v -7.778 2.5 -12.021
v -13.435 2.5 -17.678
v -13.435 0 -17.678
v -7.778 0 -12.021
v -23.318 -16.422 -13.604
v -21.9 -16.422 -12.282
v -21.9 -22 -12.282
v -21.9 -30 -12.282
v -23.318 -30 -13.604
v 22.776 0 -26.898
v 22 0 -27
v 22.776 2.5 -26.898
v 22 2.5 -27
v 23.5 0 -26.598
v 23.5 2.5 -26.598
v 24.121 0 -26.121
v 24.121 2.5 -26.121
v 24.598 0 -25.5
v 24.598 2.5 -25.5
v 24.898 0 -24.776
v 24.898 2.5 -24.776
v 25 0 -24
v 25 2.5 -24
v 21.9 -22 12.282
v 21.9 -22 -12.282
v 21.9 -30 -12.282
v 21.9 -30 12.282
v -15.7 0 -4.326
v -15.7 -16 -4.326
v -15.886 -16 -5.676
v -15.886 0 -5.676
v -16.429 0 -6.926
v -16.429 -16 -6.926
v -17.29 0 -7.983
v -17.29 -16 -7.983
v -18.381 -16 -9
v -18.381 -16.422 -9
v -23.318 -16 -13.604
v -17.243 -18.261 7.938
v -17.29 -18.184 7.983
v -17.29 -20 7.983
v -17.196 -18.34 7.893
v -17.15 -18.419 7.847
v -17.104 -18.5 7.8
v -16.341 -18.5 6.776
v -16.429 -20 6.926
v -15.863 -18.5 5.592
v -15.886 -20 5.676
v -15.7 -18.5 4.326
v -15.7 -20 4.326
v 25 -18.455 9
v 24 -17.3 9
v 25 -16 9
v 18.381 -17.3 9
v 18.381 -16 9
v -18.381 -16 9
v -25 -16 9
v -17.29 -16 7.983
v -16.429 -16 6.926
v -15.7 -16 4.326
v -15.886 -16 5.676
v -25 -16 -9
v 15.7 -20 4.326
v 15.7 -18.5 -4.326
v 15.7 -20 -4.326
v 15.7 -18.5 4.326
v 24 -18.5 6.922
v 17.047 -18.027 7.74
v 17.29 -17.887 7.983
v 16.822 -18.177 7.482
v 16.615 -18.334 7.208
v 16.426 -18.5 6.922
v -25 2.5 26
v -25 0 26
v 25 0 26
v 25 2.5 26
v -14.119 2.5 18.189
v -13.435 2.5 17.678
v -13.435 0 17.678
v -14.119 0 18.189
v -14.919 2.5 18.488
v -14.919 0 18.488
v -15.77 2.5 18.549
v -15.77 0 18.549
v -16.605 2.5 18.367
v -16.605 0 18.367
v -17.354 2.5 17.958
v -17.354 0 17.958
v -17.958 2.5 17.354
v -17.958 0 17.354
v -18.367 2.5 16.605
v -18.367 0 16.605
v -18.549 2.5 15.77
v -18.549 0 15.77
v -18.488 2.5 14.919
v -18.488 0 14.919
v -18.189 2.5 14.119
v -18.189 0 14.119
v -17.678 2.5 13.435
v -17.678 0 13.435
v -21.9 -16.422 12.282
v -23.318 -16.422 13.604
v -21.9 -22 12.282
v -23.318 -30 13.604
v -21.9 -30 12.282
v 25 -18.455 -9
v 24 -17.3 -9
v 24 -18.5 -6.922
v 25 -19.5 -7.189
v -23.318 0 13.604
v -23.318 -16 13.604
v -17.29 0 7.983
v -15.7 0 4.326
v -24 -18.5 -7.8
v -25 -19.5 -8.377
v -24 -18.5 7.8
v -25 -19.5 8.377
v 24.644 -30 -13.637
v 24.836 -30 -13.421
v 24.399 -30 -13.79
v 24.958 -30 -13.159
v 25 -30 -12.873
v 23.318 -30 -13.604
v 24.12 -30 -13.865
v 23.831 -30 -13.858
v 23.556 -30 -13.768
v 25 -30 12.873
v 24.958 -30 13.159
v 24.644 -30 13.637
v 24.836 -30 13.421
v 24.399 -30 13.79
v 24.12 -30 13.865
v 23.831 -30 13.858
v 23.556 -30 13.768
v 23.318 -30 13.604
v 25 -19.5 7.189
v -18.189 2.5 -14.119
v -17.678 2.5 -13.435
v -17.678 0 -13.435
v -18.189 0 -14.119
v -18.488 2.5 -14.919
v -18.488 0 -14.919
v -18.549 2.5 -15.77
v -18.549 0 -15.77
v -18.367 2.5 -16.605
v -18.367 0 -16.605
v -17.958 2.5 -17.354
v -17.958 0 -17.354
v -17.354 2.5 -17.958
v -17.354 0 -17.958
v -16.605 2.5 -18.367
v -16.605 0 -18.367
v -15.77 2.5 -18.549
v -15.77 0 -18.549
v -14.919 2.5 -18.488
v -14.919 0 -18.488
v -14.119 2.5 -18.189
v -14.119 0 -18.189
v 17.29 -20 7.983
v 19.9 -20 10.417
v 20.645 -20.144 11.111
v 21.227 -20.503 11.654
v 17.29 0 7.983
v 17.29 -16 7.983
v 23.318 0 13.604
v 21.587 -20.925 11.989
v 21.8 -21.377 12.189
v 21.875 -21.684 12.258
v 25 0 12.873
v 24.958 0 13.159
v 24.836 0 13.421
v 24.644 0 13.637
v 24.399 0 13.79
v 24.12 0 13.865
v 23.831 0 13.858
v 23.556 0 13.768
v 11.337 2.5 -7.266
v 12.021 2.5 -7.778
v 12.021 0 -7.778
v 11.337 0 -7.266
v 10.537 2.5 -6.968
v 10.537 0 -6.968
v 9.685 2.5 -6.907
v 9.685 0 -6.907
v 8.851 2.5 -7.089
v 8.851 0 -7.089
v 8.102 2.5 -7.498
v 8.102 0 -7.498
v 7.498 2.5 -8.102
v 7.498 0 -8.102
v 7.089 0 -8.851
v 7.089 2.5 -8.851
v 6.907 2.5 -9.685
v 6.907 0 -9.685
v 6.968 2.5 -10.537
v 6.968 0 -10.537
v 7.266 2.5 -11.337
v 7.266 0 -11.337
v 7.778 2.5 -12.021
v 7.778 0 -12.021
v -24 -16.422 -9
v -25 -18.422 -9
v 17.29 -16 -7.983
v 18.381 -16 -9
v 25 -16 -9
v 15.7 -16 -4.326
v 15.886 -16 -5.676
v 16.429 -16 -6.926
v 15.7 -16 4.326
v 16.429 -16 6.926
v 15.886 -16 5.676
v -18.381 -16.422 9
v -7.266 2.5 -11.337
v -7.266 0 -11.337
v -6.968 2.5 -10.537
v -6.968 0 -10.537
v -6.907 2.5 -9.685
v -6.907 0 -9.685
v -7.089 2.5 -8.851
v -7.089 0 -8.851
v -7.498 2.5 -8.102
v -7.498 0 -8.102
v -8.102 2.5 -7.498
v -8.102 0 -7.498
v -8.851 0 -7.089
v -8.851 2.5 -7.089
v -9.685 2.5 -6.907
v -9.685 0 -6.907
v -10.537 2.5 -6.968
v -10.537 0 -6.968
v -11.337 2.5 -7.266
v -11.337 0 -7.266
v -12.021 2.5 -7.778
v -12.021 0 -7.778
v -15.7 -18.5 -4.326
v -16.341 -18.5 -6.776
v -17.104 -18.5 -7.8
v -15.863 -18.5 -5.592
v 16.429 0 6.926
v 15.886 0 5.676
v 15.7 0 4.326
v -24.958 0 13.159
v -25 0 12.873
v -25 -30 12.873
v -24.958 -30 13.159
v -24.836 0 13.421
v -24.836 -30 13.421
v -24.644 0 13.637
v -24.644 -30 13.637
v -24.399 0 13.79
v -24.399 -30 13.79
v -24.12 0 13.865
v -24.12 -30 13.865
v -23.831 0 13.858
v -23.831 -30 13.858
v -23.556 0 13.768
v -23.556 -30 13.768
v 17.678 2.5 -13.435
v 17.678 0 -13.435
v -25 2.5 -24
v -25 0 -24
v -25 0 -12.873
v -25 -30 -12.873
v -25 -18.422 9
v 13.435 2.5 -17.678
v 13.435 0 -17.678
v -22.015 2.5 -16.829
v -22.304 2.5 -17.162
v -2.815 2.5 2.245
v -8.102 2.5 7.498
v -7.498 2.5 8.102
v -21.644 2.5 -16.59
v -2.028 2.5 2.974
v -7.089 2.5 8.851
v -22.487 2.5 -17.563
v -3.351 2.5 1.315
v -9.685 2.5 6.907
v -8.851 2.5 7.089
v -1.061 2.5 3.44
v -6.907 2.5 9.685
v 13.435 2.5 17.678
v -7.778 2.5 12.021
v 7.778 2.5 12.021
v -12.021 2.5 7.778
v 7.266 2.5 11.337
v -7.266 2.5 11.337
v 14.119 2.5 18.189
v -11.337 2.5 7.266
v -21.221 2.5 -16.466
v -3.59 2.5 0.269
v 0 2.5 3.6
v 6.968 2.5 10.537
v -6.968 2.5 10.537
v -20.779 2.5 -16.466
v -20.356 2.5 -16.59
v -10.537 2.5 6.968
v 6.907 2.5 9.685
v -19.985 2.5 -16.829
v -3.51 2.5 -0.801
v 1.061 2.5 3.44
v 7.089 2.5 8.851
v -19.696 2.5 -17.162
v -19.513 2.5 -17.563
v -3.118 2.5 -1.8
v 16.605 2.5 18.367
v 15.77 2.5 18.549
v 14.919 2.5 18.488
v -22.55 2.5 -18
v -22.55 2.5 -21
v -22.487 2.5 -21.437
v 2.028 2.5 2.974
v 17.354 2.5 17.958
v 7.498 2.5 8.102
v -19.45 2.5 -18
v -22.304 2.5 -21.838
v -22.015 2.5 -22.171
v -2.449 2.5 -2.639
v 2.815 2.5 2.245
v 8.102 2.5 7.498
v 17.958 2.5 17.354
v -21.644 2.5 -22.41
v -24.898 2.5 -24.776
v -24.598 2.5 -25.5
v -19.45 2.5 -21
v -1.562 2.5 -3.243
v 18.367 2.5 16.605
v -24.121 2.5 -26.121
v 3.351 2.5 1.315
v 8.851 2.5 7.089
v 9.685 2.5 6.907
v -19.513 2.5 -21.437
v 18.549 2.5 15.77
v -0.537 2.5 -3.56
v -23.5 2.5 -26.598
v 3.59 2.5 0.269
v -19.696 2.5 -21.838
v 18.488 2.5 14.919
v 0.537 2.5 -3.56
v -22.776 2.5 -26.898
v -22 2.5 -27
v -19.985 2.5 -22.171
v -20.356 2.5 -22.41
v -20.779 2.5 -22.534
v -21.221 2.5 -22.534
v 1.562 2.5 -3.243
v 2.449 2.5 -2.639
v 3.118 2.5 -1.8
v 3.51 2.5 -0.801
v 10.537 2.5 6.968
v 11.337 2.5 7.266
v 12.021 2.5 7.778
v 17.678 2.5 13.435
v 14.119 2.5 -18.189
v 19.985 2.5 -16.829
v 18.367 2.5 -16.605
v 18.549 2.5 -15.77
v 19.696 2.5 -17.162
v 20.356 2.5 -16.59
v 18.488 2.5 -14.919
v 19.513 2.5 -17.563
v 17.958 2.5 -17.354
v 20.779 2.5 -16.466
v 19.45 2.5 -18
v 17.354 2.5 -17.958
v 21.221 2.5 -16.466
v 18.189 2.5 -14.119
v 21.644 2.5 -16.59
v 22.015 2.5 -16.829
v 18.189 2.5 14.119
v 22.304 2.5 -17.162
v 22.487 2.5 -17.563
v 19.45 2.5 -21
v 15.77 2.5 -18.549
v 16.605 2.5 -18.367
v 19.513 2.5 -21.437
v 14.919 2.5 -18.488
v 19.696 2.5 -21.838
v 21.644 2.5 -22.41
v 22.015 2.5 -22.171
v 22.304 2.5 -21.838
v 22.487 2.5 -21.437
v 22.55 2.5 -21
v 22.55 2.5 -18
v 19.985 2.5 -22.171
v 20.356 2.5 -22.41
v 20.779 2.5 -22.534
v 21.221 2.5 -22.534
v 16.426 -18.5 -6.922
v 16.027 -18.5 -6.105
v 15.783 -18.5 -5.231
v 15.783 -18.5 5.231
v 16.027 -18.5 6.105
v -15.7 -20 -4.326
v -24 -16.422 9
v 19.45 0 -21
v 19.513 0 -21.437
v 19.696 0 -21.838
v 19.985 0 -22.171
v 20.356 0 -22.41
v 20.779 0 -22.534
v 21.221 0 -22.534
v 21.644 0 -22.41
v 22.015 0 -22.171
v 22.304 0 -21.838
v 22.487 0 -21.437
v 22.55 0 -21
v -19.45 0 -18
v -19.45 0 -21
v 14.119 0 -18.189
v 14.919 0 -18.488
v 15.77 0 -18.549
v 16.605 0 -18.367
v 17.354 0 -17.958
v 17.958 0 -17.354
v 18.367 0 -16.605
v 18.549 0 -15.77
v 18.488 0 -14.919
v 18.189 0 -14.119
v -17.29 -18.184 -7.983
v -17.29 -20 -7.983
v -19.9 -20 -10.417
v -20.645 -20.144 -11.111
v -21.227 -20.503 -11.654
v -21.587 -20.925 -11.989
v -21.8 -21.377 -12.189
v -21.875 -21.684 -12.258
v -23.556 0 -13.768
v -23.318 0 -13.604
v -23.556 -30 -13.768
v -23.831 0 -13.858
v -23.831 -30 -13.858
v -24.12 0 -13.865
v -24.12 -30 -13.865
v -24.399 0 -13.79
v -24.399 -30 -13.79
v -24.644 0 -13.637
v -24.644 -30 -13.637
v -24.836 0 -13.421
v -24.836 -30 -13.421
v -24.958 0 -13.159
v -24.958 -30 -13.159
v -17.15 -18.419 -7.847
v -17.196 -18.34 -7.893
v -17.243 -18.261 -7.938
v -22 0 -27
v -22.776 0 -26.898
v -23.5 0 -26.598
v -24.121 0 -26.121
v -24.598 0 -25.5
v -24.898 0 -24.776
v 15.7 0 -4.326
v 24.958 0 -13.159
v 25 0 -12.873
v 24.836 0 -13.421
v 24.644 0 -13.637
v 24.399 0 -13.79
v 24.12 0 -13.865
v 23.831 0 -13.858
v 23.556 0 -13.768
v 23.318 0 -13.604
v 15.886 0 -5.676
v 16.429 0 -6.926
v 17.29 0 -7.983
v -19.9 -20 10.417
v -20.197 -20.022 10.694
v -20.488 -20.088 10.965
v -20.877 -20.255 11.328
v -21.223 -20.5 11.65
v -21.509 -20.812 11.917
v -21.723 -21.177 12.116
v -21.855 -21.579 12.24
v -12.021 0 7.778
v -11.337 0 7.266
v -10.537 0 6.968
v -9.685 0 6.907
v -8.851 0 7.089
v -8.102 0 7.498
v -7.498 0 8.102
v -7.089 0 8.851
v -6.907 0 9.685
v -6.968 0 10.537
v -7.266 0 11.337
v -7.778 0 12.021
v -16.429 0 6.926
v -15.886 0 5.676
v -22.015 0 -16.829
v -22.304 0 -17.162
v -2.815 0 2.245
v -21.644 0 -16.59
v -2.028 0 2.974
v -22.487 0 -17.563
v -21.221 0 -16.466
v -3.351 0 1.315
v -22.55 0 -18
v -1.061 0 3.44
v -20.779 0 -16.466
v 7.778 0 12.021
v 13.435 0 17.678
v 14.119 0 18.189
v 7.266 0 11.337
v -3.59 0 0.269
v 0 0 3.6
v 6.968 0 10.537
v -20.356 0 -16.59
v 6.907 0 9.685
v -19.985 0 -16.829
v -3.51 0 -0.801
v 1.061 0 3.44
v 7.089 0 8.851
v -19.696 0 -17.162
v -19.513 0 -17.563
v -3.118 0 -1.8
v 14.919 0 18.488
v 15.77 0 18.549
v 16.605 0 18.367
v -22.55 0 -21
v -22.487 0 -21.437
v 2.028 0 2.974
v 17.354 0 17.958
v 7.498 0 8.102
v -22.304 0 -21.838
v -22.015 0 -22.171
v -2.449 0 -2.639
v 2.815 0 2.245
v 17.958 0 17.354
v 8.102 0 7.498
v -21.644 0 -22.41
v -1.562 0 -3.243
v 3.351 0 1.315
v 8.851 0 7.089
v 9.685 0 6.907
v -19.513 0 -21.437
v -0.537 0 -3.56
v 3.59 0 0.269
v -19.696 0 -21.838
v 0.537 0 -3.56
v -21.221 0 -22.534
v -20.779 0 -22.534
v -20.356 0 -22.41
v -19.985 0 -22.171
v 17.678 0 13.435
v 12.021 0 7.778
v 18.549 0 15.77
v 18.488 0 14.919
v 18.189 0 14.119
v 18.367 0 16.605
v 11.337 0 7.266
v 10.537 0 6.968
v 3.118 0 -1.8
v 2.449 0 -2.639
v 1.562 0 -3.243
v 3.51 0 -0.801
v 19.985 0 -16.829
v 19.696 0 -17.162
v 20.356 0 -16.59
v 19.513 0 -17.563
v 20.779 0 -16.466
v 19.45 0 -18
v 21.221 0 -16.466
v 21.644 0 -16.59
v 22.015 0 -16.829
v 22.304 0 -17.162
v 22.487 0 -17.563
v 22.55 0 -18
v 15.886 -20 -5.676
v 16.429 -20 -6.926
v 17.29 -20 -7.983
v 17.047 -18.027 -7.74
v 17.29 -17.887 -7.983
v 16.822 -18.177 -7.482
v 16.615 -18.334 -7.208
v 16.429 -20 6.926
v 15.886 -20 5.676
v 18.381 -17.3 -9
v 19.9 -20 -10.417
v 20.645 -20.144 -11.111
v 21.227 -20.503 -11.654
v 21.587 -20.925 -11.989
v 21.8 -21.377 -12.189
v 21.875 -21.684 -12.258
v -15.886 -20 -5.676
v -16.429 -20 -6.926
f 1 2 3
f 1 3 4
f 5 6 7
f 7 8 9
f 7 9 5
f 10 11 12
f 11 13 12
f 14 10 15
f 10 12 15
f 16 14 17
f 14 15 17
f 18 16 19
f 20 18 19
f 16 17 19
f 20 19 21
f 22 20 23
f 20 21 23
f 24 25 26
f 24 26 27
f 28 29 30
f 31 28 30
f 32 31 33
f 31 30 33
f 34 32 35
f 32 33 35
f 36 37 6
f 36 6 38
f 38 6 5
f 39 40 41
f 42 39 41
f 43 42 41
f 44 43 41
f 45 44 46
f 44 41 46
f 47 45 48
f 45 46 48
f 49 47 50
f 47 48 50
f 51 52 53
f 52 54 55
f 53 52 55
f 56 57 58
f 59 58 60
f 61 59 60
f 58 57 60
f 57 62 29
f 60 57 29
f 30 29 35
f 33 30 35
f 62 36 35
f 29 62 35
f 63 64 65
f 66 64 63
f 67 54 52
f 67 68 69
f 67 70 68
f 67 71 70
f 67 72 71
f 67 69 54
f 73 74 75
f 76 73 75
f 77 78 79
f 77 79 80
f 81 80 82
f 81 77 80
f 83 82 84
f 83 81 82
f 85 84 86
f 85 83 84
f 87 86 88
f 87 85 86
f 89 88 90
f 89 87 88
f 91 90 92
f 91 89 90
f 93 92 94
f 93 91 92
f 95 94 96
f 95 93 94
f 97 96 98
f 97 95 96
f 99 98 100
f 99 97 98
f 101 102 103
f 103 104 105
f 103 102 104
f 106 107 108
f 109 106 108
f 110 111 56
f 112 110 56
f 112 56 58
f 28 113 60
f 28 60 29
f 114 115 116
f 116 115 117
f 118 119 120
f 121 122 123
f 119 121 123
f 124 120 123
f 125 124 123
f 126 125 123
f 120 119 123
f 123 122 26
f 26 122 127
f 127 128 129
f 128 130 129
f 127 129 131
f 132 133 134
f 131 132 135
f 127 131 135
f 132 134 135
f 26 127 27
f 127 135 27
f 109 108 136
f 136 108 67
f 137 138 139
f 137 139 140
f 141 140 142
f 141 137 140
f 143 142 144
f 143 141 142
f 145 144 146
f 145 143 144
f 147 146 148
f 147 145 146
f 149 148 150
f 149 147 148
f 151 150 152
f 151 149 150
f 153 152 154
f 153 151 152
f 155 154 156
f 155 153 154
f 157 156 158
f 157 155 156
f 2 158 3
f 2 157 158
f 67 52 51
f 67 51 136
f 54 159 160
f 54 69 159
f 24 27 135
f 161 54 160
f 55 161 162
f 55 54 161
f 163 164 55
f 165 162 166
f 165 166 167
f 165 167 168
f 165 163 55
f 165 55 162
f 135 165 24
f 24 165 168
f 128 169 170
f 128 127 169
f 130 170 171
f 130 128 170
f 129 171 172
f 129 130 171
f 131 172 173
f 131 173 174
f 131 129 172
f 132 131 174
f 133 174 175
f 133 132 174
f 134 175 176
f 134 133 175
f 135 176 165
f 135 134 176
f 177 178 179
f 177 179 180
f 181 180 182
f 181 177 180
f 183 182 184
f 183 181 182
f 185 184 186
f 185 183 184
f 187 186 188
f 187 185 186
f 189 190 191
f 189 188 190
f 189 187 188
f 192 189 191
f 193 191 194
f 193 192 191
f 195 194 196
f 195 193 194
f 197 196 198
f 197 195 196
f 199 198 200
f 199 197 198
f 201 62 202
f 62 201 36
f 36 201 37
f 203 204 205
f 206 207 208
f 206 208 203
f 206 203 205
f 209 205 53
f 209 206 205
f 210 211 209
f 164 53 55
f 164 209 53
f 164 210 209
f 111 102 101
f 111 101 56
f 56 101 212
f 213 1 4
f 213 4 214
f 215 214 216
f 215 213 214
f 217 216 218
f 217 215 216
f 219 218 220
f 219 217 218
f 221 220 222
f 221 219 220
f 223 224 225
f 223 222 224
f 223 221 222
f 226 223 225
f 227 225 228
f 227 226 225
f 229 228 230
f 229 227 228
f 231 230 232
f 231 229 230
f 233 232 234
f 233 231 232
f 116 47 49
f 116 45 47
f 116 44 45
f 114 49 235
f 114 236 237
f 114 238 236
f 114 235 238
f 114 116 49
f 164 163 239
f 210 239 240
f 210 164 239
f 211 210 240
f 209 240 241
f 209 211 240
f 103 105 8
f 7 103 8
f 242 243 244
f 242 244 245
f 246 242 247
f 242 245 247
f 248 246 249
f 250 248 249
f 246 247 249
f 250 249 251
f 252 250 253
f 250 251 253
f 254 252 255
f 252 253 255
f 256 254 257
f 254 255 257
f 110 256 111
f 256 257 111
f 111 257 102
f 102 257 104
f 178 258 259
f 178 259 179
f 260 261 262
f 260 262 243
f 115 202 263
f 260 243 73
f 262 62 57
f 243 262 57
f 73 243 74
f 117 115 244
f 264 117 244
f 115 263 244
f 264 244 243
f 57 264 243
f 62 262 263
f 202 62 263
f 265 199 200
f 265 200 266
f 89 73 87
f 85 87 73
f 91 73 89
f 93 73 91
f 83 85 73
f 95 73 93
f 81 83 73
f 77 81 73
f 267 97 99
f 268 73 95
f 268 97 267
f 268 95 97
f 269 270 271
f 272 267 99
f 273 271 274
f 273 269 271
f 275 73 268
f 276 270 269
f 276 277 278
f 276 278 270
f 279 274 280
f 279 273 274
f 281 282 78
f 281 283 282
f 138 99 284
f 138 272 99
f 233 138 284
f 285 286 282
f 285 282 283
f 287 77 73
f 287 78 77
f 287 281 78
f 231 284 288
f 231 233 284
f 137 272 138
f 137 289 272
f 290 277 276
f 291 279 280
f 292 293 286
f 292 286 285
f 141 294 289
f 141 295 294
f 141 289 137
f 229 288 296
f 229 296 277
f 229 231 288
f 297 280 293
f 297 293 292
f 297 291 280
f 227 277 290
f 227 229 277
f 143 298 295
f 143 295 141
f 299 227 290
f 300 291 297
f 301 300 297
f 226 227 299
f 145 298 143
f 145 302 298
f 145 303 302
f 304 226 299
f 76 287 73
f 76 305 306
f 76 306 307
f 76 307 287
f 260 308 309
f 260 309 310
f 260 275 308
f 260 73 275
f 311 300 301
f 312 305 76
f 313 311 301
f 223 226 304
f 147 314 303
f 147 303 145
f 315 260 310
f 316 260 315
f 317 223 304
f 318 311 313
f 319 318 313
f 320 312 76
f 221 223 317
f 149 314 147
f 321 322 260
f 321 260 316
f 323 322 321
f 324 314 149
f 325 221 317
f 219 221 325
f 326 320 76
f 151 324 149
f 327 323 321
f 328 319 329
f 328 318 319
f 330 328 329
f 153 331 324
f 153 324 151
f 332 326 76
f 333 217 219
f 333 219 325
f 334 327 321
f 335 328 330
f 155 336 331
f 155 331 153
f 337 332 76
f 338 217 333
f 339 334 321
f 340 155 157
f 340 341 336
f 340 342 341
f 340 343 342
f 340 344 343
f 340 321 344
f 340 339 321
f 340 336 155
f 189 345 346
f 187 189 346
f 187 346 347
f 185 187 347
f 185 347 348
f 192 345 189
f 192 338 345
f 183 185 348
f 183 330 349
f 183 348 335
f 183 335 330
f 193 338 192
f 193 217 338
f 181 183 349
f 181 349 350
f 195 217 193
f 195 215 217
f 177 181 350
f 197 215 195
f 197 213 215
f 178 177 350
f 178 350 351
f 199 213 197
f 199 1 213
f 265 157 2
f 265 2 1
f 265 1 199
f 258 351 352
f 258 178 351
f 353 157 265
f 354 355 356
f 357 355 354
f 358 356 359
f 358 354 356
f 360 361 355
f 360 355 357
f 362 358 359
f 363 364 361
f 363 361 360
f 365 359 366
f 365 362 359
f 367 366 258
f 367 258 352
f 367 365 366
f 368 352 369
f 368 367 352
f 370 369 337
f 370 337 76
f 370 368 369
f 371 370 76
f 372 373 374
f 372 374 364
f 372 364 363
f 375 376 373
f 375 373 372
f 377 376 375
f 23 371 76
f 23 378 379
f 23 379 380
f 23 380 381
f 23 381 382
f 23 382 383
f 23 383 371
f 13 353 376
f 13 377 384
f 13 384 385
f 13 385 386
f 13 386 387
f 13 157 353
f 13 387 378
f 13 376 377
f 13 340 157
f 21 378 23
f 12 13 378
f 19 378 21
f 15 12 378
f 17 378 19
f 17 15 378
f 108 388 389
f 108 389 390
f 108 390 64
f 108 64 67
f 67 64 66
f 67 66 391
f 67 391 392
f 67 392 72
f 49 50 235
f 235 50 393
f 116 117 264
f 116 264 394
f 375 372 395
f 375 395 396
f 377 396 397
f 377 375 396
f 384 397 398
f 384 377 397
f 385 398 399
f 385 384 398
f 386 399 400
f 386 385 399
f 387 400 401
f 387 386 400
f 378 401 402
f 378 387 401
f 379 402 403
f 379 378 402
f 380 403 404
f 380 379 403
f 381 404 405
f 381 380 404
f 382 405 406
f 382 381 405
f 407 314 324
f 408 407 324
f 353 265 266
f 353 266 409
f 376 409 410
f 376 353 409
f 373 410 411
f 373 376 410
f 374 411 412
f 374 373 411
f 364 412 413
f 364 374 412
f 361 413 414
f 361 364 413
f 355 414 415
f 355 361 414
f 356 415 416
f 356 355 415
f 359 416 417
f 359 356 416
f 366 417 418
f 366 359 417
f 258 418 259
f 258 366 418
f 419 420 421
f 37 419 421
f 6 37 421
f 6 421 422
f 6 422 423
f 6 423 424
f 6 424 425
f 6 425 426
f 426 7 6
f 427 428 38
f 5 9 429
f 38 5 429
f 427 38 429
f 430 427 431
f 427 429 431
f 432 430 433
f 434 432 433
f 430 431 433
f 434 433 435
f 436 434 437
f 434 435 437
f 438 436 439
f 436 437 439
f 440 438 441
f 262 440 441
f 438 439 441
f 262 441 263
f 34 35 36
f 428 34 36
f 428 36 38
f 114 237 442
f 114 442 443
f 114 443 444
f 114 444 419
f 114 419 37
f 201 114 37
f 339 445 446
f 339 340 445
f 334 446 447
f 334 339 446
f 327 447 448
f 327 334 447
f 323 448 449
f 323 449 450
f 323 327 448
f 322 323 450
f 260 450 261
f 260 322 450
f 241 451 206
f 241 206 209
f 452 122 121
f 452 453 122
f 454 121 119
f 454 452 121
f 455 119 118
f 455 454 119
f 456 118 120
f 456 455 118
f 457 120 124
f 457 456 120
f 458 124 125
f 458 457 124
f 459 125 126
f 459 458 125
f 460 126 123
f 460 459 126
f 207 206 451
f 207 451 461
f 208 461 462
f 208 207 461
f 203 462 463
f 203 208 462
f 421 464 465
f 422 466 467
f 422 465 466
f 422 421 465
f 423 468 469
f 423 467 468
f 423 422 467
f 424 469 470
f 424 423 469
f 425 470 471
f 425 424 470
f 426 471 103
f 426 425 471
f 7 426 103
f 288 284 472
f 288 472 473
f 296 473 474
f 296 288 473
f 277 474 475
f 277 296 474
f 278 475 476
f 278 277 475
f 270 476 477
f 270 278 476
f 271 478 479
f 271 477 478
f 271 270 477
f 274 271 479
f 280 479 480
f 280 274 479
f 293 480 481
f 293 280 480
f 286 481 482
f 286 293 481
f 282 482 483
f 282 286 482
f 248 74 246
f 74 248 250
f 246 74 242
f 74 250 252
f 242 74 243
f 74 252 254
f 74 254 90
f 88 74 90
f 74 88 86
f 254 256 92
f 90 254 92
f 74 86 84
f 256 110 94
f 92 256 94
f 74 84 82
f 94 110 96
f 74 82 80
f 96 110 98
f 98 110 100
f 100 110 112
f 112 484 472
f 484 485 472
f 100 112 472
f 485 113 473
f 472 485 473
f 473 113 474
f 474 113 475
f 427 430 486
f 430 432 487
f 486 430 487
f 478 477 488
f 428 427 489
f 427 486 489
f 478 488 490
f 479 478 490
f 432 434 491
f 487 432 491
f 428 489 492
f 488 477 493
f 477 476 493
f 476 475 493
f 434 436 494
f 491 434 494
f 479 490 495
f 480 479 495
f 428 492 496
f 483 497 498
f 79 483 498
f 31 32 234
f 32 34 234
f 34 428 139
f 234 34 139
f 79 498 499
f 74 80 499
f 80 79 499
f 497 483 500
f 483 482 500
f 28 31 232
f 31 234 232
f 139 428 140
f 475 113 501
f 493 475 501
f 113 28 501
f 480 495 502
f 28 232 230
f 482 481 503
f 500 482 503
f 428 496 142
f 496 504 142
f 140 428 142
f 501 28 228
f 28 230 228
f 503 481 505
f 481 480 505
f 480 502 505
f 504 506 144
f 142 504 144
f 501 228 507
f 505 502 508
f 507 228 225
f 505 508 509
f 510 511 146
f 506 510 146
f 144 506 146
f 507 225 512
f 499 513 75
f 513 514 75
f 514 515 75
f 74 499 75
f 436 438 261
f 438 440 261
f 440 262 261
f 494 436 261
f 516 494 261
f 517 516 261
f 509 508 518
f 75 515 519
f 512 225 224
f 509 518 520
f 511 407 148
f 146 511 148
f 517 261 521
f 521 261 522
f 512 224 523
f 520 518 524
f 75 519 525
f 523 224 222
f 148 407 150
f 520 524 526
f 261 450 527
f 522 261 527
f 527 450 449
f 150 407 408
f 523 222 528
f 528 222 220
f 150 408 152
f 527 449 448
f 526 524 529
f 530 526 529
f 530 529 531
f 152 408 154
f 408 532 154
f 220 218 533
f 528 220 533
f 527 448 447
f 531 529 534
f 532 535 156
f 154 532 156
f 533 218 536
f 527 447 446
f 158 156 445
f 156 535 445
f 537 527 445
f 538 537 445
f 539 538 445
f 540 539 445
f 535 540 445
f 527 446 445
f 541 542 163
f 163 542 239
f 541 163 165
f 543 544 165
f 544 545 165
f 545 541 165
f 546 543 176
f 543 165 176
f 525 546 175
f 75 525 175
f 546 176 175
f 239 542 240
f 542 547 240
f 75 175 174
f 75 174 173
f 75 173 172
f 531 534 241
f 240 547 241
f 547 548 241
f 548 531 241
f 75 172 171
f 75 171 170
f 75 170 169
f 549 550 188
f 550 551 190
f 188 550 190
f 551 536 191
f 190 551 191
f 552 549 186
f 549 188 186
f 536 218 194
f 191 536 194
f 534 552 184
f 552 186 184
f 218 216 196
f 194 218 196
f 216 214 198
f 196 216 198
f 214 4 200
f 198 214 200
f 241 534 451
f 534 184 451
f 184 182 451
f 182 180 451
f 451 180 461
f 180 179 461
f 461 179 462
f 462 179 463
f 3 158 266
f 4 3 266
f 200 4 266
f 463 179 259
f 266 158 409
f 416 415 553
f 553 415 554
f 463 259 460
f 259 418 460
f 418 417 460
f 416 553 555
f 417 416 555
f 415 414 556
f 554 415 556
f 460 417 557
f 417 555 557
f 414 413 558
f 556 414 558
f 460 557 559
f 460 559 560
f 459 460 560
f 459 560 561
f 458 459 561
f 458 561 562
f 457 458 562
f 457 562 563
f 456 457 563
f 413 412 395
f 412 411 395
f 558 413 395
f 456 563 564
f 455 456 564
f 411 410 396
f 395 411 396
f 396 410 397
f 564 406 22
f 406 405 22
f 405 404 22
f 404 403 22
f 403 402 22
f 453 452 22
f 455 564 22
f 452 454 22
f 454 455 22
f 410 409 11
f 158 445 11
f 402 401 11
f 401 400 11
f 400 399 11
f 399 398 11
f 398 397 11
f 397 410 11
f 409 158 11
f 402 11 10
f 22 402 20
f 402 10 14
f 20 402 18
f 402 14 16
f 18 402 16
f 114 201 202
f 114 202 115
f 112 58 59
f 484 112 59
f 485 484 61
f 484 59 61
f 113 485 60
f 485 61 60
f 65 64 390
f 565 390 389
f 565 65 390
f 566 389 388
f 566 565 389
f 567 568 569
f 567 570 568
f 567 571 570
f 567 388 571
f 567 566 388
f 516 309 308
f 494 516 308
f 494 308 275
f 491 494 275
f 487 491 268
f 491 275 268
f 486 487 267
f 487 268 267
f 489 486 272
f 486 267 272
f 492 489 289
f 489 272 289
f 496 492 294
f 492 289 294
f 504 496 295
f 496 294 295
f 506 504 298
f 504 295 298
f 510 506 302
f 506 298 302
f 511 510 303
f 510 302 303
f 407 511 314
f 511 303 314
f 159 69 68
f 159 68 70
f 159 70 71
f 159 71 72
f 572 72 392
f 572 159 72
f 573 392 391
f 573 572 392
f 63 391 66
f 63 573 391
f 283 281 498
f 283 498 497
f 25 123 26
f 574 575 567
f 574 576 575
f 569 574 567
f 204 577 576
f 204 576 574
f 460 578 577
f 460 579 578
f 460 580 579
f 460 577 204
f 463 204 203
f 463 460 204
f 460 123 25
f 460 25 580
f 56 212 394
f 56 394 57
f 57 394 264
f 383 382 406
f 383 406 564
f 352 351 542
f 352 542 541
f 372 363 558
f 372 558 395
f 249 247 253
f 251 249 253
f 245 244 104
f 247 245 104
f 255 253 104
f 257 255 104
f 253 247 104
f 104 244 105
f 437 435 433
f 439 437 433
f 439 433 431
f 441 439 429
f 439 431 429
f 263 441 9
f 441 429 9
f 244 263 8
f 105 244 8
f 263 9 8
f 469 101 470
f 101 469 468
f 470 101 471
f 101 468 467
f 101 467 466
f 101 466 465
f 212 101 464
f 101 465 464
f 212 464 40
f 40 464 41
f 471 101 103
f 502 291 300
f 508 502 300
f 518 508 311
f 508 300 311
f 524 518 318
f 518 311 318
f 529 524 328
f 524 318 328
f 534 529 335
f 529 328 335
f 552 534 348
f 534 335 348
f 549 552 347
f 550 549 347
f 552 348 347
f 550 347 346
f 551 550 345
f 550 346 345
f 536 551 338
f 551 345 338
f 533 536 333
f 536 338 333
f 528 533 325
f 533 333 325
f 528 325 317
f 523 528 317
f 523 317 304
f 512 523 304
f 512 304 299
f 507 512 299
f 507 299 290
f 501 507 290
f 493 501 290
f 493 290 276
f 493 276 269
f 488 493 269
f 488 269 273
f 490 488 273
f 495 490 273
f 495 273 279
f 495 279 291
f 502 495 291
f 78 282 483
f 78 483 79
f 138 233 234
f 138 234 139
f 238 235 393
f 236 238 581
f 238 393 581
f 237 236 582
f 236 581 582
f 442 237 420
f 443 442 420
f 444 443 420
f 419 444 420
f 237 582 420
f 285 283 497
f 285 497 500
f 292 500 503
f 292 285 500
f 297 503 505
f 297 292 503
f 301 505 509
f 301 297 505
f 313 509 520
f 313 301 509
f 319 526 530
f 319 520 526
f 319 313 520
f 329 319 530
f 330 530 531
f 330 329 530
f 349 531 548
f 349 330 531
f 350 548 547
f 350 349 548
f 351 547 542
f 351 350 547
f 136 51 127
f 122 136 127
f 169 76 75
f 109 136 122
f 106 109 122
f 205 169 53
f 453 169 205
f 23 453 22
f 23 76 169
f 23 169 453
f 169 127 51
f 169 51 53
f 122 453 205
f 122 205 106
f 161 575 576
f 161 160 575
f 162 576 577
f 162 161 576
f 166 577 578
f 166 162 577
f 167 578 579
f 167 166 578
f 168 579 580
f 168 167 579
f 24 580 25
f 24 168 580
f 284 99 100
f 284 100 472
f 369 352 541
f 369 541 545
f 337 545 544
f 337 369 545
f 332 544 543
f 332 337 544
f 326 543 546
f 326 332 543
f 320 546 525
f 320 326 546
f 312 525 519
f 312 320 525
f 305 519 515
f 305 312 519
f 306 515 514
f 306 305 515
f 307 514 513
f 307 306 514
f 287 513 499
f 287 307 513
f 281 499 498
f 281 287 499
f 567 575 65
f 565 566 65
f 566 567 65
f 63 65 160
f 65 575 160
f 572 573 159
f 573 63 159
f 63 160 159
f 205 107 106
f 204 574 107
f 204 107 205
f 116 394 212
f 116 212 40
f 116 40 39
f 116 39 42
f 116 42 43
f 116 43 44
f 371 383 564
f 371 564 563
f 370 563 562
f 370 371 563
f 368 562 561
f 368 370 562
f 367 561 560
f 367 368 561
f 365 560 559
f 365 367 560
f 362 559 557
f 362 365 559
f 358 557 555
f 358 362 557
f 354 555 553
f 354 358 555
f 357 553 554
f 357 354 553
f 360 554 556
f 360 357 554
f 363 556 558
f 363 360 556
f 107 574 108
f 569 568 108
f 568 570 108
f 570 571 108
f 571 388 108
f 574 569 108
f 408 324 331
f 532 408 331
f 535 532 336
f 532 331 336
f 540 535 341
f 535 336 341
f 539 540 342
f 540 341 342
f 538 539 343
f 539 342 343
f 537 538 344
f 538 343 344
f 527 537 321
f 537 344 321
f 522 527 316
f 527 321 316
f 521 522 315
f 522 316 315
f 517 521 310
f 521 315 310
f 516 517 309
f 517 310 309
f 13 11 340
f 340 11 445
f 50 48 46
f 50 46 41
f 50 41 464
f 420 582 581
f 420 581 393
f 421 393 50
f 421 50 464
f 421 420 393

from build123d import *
from OCP.BRepFilletAPI import BRepFilletAPI_MakeChamfer

# Parameters (mm, degrees)
DODANIE_WYCI_GNI_CIE2_DEPTH = 2.5
SZKIC6_R                    = 3.6
WYTNIJ_WYCI_GNI_CIE3_DEPTH  = 37.881567212
DODANIE_WYCI_GNI_CIE3_DEPTH = 20
DODANIE_WYCI_GNI_CIE4_DEPTH = 10
ZAOKR_GLENIE1_R             = 1
ZAOKR_GLENIE2_R             = 5
WYTNIJ_WYCI_GNI_CIE1_REACH  = 59.319
SZKIC3_W                    = 18
SZKIC3_H                    = 2.5
SFAZOWANIE1_SIZE            = 1.2
SFAZOWANIE1_SIZE2           = 2.078460969
ZAOKR_GLENIE4_R             = 2
LUSTRO1_START               = -16
LUSTRO1_DEPTH               = 16
LUSTRO1_START_2             = -30
LUSTRO1_2_DEPTH             = 13.578460969
LUSTRO1_START_3             = -22
LUSTRO1_3_DEPTH             = 5.578460969
LUSTRO1_START_4             = -18.183542828
LUSTRO1_4_DEPTH             = 2.183542828
LUSTRO1_START_5             = -12.281593534
LUSTRO1_5_DEPTH             = 24.563187068
LUSTRO1_START_6             = -26
LUSTRO1_6_DEPTH             = 10.3
WYTNIJ_WYCI_GNI_CIE2_REACH  = 51.094
SFAZOWANIE2_SIZE            = 1
ZAOKR_GLENIE3_R             = 3


with BuildPart() as part:
    # Szkic1 → Dodanie-wyciągnięcie2 (new body)
    with BuildSketch(Plane(origin=(0, 0, 0), x_dir=(1, 0, 0), z_dir=(0, 1, 0))):
        Polygon((-25, -11), (-25, -26), (25, -26), (25, -11), (25, 27), (-25, 27), align=None)
    extrude(amount=DODANIE_WYCI_GNI_CIE2_DEPTH)

    # Szkic6 → Wytnij-wyciągnięcie3 (cut, through all)
    with BuildSketch(Plane(origin=(0, 2.5, 0), x_dir=(1, 0, 0), z_dir=(0, 1, 0))):
        with Locations(Location((0, 0, 0), (0, 0, 270))):
            Circle(SZKIC6_R)
        with BuildLine():
            Line((7.778174593, 12.02081528), (13.435028843, 17.67766953))
            ThreePointArc((13.435028843, 17.67766953), (17.67766953, 17.67766953), (17.67766953, 13.435028843))
            Line((17.67766953, 13.435028843), (12.02081528, 7.778174593))
            ThreePointArc((12.02081528, 7.778174593), (7.778174593, 7.778174593), (7.778174593, 12.02081528))
        make_face()
        with BuildLine():
            Line((12.02081528, -7.778174593), (17.67766953, -13.435028843))
            ThreePointArc((17.67766953, -13.435028843), (17.67766953, -17.67766953), (13.435028843, -17.67766953))
            Line((13.435028843, -17.67766953), (7.778174593, -12.02081528))
            ThreePointArc((7.778174593, -12.02081528), (7.778174593, -7.778174593), (12.02081528, -7.778174593))
        make_face()
        with BuildLine():
            Line((-7.778174593, -12.02081528), (-13.435028843, -17.67766953))
            ThreePointArc((-13.435028843, -17.67766953), (-17.67766953, -17.67766953), (-17.67766953, -13.435028843))
            Line((-17.67766953, -13.435028843), (-12.02081528, -7.778174593))
            ThreePointArc((-12.02081528, -7.778174593), (-7.778174593, -7.778174593), (-7.778174593, -12.02081528))
        make_face()
        with BuildLine():
            Line((-12.02081528, 7.778174593), (-17.67766953, 13.435028843))
            ThreePointArc((-17.67766953, 13.435028843), (-17.67766953, 17.67766953), (-13.435028843, 17.67766953))
            Line((-13.435028843, 17.67766953), (-7.778174593, 12.02081528))
            ThreePointArc((-7.778174593, 12.02081528), (-7.778174593, 7.778174593), (-12.02081528, 7.778174593))
        make_face()
    extrude(amount=-WYTNIJ_WYCI_GNI_CIE3_DEPTH, mode=Mode.SUBTRACT)

    # Szkic2 → Dodanie-wyciągnięcie3 (add)
    with BuildSketch(Plane.XZ):
        Polygon((15.7, -6.5), (15.7, 6.5), (25, 15.172390301), (25, -15.172390301), align=None)
    extrude(amount=DODANIE_WYCI_GNI_CIE3_DEPTH)

    # Szkic8 → Dodanie-wyciągnięcie4 (add)
    with BuildSketch(Plane.XZ.offset(20)):
        Polygon((25, 15.172390301), (25, -15.172390301), (21.9, -12.281593534), (21.9, 12.281593534), align=None)
    extrude(amount=DODANIE_WYCI_GNI_CIE4_DEPTH)

    # Zaokrąglenie1
    zaokr_glenie1_edges = [part.edges().sort_by_distance(p)[0] for p in [
        (25, -15, 15.172390301),
        (25, -15, -15.172390301),
    ]]
    fillet(zaokr_glenie1_edges, radius=ZAOKR_GLENIE1_R)

    # Zaokrąglenie2
    zaokr_glenie2_edges = [part.edges().sort_by_distance(p)[0] for p in [
        (15.7, -10, 6.5),
        (15.7, -10, -6.5),
    ]]
    fillet(zaokr_glenie2_edges, radius=ZAOKR_GLENIE2_R)

    # Szkic3 → Wytnij-wyciągnięcie1 (cut, up to next)
    with BuildSketch(Plane.ZY.offset(-15.7), mode=Mode.PRIVATE) as wytnij_wyci_gni_cie1_sk1:
        with Locations((0, -17.25)):
            Rectangle(SZKIC3_W, SZKIC3_H)
    wytnij_wyci_gni_cie1_tool1 = extrude(wytnij_wyci_gni_cie1_sk1.sketch, amount=-WYTNIJ_WYCI_GNI_CIE1_REACH, mode=Mode.PRIVATE) & part.part
    add(wytnij_wyci_gni_cie1_tool1.solids().sort_by_distance((15.7, -17.25, 0))[0], mode=Mode.SUBTRACT)

    # Sfazowanie1: one chamfer whose edges measure the first distance from different faces: ONE call of the kernel's chamfer builder (chamfer() names one face for all edges)
    sfazowanie1_edges_1 = [part.edges().sort_by_distance(p)[0] for p in [
        (21.690460888, -18.5, -9),
    ]]
    sfazowanie1_side_1 = [part.faces().sort_by_distance(p)[0] for p in [
        (21.690460888, -17.25, -9),
    ]]
    sfazowanie1_edges_2 = [part.edges().sort_by_distance(p)[0] for p in [
        (21.690460888, -18.5, 9),
    ]]
    sfazowanie1_side_2 = [part.faces().sort_by_distance(p)[0] for p in [
        (21.690460888, -17.25, 9),
    ]]
    sfazowanie1 = BRepFilletAPI_MakeChamfer(part.part.solid().wrapped)
    for e in sfazowanie1_edges_1:
        sfazowanie1.Add(SFAZOWANIE1_SIZE, SFAZOWANIE1_SIZE2, e.wrapped, sfazowanie1_side_1[0].wrapped)  # the first distance lies on this face
    for e in sfazowanie1_edges_2:
        sfazowanie1.Add(SFAZOWANIE1_SIZE, SFAZOWANIE1_SIZE2, e.wrapped, sfazowanie1_side_2[0].wrapped)  # the first distance lies on this face
    add(Compound.cast(sfazowanie1.Shape()), mode=Mode.REPLACE)

    # Zaokrąglenie4
    zaokr_glenie4_edges = [part.edges().sort_by_distance(p)[0] for p in [
        (21.9, -20, 0),
    ]]
    fillet(zaokr_glenie4_edges, radius=ZAOKR_GLENIE4_R)

    # Lustro1: read off the stored shape, not the designer's step
    # Lustro1 outline → Lustro1 (add)
    with BuildSketch(Plane(origin=(0, 0, 0), x_dir=(1, 0, 0), z_dir=(0, 1, 0)).offset(LUSTRO1_START)):
        with BuildLine():
            ThreePointArc((-25, -12.872547754), (-24.398749069, -13.789607828), (-23.31800164, -13.603901455))
            Line((-23.31800164, -13.603901455), (-17.2900082, -7.982706633))
            ThreePointArc((-17.2900082, -7.982706633), (-16.114699628, -6.31968347), (-15.7, -4.325938125))
            Line((-15.7, -4.325938125), (-15.7, 4.325938125))
            ThreePointArc((-15.7, 4.325938125), (-16.114699628, 6.31968347), (-17.2900082, 7.982706633))
            Line((-17.2900082, 7.982706633), (-23.31800164, 13.603901455))
            ThreePointArc((-23.31800164, 13.603901455), (-24.398749069, 13.789607828), (-25, 12.872547754))
            Line((-25, 12.872547754), (-25, -12.872547754))
        make_face()
    extrude(amount=LUSTRO1_DEPTH)



with BuildPart() as body_2:
    # Lustro1 2 outline → Lustro1 2 (new body)
    with BuildSketch(Plane(origin=(0, 0, 0), x_dir=(1, 0, 0), z_dir=(0, 1, 0)).offset(LUSTRO1_START_2)):
        with BuildLine():
            ThreePointArc((-25, -12.872547754), (-24.398749069, -13.789607828), (-23.31800164, -13.603901455))
            Line((-23.31800164, -13.603901455), (-21.9, -12.281593534))
            Line((-21.9, -12.281593534), (-21.9, 12.281593534))
            Line((-21.9, 12.281593534), (-23.31800164, 13.603901455))
            ThreePointArc((-23.31800164, 13.603901455), (-24.398749069, 13.789607828), (-25, 12.872547754))
            Line((-25, 12.872547754), (-25, -12.872547754))
        make_face()
    extrude(amount=LUSTRO1_2_DEPTH)

    # Lustro1 3 outline → Lustro1 3 (add)
    with BuildSketch(Plane(origin=(0, 0, 0), x_dir=(1, 0, 0), z_dir=(0, 1, 0)).offset(LUSTRO1_START_3)):
        with BuildLine():
            Line((-21.9, -12.281593534), (-17.2900082, -7.982706633))
            ThreePointArc((-17.2900082, -7.982706633), (-16.114699628, -6.31968347), (-15.7, -4.325938125))
            Line((-15.7, -4.325938125), (-15.7, 4.325938125))
            ThreePointArc((-15.7, 4.325938125), (-16.114699628, 6.31968347), (-17.2900082, 7.982706633))
            Line((-17.2900082, 7.982706633), (-21.9, 12.281593534))
            Line((-21.9, 12.281593534), (-21.9, -12.281593534))
        make_face()
    extrude(amount=LUSTRO1_3_DEPTH)


with BuildPart() as part_1:
    add(part.part)

    add(body_2.part)  # Lustro1 4 merges body 2
    # Lustro1 4 outline → Lustro1 4 (add)
    with BuildSketch(Plane(origin=(0, 0, 0), x_dir=(1, 0, 0), z_dir=(0, 1, 0)).offset(LUSTRO1_START_4)):
        with BuildLine():
            Line((-25, -9), (-25, -12.872547754))
            ThreePointArc((-25, -12.872547754), (-24.398749069, -13.789607828), (-23.31800164, -13.603901455))
            Line((-23.31800164, -13.603901455), (-18.380921775, -9))
            Line((-18.380921775, -9), (-25, -9))
        make_face()
        with BuildLine():
            Line((-25, 12.872547754), (-25, 9))
            Line((-25, 9), (-18.380921775, 9))
            Line((-18.380921775, 9), (-23.31800164, 13.603901455))
            ThreePointArc((-23.31800164, 13.603901455), (-24.398749069, 13.789607828), (-25, 12.872547754))
        make_face()
    extrude(amount=LUSTRO1_4_DEPTH)

    # Lustro1 5 outline → Lustro1 5 (cut)
    with BuildSketch(Plane.XY.offset(LUSTRO1_START_5)):
        with BuildLine():
            Line((-15.7, -22), (-15.7, -20))
            Line((-15.7, -20), (-19.9, -20))
            ThreePointArc((-19.9, -20), (-21.314213562, -20.585786438), (-21.9, -22))
            Line((-21.9, -22), (-15.7, -22))
        make_face()
    extrude(amount=LUSTRO1_5_DEPTH, mode=Mode.SUBTRACT)

    # Lustro1 6 outline → Lustro1 6 (cut)
    with BuildSketch(Plane.YZ.offset(LUSTRO1_START_6)):
        Polygon((-18.5, 7.8), (-18.5, -7.8), (-16.421539031, -9), (-16.421539031, 9), align=None)
    extrude(amount=LUSTRO1_6_DEPTH, mode=Mode.SUBTRACT)

    # Szkic5 → Wytnij-wyciągnięcie2 (cut, up to next)
    with BuildSketch(Plane(origin=(0, 2.5, 0), x_dir=(1, 0, 0), z_dir=(0, 1, 0)), mode=Mode.PRIVATE) as wytnij_wyci_gni_cie2_sk1:
        with BuildLine():
            Line((22.55, 21), (22.55, 18))
            ThreePointArc((22.55, 18), (21, 16.45), (19.45, 18))
            Line((19.45, 18), (19.45, 21))
            ThreePointArc((19.45, 21), (21, 22.55), (22.55, 21))
        make_face()
    wytnij_wyci_gni_cie2_tool1 = extrude(wytnij_wyci_gni_cie2_sk1.sketch, amount=-WYTNIJ_WYCI_GNI_CIE2_REACH, mode=Mode.PRIVATE) & part_1.part
    wytnij_wyci_gni_cie2 = wytnij_wyci_gni_cie2_tool1.solids().sort_by_distance((21, 2.5, -19.5))[0]
    add(wytnij_wyci_gni_cie2, mode=Mode.SUBTRACT)

    # Lustro2: Wytnij-wyciągnięcie2 across plane
    add(wytnij_wyci_gni_cie2.mirror(Plane(origin=(0, 0, 0), x_dir=(0, 0, 1), z_dir=(1, 0, 0))), mode=Mode.SUBTRACT)

    # Sfazowanie2
    sfazowanie2_edges = [part_1.edges().sort_by_distance(p)[0] for p in [
        (25, -18.5, 0),
        (25, -17.9, -7.960769515),
        (25, -17.9, 7.960769515),
        (-25, -18.5, 0),
        (-25, -17.460769515, -8.4),
        (-25, -17.460769515, 8.4),
    ]]
    chamfer(sfazowanie2_edges, length=SFAZOWANIE2_SIZE)

    # Zaokrąglenie3
    zaokr_glenie3_edges = [part_1.edges().sort_by_distance(p)[0] for p in [
        (-25, 1.25, -27),
        (25, 1.25, -27),
    ]]
    fillet(zaokr_glenie3_edges, radius=ZAOKR_GLENIE3_R)


solid = part_1.part
